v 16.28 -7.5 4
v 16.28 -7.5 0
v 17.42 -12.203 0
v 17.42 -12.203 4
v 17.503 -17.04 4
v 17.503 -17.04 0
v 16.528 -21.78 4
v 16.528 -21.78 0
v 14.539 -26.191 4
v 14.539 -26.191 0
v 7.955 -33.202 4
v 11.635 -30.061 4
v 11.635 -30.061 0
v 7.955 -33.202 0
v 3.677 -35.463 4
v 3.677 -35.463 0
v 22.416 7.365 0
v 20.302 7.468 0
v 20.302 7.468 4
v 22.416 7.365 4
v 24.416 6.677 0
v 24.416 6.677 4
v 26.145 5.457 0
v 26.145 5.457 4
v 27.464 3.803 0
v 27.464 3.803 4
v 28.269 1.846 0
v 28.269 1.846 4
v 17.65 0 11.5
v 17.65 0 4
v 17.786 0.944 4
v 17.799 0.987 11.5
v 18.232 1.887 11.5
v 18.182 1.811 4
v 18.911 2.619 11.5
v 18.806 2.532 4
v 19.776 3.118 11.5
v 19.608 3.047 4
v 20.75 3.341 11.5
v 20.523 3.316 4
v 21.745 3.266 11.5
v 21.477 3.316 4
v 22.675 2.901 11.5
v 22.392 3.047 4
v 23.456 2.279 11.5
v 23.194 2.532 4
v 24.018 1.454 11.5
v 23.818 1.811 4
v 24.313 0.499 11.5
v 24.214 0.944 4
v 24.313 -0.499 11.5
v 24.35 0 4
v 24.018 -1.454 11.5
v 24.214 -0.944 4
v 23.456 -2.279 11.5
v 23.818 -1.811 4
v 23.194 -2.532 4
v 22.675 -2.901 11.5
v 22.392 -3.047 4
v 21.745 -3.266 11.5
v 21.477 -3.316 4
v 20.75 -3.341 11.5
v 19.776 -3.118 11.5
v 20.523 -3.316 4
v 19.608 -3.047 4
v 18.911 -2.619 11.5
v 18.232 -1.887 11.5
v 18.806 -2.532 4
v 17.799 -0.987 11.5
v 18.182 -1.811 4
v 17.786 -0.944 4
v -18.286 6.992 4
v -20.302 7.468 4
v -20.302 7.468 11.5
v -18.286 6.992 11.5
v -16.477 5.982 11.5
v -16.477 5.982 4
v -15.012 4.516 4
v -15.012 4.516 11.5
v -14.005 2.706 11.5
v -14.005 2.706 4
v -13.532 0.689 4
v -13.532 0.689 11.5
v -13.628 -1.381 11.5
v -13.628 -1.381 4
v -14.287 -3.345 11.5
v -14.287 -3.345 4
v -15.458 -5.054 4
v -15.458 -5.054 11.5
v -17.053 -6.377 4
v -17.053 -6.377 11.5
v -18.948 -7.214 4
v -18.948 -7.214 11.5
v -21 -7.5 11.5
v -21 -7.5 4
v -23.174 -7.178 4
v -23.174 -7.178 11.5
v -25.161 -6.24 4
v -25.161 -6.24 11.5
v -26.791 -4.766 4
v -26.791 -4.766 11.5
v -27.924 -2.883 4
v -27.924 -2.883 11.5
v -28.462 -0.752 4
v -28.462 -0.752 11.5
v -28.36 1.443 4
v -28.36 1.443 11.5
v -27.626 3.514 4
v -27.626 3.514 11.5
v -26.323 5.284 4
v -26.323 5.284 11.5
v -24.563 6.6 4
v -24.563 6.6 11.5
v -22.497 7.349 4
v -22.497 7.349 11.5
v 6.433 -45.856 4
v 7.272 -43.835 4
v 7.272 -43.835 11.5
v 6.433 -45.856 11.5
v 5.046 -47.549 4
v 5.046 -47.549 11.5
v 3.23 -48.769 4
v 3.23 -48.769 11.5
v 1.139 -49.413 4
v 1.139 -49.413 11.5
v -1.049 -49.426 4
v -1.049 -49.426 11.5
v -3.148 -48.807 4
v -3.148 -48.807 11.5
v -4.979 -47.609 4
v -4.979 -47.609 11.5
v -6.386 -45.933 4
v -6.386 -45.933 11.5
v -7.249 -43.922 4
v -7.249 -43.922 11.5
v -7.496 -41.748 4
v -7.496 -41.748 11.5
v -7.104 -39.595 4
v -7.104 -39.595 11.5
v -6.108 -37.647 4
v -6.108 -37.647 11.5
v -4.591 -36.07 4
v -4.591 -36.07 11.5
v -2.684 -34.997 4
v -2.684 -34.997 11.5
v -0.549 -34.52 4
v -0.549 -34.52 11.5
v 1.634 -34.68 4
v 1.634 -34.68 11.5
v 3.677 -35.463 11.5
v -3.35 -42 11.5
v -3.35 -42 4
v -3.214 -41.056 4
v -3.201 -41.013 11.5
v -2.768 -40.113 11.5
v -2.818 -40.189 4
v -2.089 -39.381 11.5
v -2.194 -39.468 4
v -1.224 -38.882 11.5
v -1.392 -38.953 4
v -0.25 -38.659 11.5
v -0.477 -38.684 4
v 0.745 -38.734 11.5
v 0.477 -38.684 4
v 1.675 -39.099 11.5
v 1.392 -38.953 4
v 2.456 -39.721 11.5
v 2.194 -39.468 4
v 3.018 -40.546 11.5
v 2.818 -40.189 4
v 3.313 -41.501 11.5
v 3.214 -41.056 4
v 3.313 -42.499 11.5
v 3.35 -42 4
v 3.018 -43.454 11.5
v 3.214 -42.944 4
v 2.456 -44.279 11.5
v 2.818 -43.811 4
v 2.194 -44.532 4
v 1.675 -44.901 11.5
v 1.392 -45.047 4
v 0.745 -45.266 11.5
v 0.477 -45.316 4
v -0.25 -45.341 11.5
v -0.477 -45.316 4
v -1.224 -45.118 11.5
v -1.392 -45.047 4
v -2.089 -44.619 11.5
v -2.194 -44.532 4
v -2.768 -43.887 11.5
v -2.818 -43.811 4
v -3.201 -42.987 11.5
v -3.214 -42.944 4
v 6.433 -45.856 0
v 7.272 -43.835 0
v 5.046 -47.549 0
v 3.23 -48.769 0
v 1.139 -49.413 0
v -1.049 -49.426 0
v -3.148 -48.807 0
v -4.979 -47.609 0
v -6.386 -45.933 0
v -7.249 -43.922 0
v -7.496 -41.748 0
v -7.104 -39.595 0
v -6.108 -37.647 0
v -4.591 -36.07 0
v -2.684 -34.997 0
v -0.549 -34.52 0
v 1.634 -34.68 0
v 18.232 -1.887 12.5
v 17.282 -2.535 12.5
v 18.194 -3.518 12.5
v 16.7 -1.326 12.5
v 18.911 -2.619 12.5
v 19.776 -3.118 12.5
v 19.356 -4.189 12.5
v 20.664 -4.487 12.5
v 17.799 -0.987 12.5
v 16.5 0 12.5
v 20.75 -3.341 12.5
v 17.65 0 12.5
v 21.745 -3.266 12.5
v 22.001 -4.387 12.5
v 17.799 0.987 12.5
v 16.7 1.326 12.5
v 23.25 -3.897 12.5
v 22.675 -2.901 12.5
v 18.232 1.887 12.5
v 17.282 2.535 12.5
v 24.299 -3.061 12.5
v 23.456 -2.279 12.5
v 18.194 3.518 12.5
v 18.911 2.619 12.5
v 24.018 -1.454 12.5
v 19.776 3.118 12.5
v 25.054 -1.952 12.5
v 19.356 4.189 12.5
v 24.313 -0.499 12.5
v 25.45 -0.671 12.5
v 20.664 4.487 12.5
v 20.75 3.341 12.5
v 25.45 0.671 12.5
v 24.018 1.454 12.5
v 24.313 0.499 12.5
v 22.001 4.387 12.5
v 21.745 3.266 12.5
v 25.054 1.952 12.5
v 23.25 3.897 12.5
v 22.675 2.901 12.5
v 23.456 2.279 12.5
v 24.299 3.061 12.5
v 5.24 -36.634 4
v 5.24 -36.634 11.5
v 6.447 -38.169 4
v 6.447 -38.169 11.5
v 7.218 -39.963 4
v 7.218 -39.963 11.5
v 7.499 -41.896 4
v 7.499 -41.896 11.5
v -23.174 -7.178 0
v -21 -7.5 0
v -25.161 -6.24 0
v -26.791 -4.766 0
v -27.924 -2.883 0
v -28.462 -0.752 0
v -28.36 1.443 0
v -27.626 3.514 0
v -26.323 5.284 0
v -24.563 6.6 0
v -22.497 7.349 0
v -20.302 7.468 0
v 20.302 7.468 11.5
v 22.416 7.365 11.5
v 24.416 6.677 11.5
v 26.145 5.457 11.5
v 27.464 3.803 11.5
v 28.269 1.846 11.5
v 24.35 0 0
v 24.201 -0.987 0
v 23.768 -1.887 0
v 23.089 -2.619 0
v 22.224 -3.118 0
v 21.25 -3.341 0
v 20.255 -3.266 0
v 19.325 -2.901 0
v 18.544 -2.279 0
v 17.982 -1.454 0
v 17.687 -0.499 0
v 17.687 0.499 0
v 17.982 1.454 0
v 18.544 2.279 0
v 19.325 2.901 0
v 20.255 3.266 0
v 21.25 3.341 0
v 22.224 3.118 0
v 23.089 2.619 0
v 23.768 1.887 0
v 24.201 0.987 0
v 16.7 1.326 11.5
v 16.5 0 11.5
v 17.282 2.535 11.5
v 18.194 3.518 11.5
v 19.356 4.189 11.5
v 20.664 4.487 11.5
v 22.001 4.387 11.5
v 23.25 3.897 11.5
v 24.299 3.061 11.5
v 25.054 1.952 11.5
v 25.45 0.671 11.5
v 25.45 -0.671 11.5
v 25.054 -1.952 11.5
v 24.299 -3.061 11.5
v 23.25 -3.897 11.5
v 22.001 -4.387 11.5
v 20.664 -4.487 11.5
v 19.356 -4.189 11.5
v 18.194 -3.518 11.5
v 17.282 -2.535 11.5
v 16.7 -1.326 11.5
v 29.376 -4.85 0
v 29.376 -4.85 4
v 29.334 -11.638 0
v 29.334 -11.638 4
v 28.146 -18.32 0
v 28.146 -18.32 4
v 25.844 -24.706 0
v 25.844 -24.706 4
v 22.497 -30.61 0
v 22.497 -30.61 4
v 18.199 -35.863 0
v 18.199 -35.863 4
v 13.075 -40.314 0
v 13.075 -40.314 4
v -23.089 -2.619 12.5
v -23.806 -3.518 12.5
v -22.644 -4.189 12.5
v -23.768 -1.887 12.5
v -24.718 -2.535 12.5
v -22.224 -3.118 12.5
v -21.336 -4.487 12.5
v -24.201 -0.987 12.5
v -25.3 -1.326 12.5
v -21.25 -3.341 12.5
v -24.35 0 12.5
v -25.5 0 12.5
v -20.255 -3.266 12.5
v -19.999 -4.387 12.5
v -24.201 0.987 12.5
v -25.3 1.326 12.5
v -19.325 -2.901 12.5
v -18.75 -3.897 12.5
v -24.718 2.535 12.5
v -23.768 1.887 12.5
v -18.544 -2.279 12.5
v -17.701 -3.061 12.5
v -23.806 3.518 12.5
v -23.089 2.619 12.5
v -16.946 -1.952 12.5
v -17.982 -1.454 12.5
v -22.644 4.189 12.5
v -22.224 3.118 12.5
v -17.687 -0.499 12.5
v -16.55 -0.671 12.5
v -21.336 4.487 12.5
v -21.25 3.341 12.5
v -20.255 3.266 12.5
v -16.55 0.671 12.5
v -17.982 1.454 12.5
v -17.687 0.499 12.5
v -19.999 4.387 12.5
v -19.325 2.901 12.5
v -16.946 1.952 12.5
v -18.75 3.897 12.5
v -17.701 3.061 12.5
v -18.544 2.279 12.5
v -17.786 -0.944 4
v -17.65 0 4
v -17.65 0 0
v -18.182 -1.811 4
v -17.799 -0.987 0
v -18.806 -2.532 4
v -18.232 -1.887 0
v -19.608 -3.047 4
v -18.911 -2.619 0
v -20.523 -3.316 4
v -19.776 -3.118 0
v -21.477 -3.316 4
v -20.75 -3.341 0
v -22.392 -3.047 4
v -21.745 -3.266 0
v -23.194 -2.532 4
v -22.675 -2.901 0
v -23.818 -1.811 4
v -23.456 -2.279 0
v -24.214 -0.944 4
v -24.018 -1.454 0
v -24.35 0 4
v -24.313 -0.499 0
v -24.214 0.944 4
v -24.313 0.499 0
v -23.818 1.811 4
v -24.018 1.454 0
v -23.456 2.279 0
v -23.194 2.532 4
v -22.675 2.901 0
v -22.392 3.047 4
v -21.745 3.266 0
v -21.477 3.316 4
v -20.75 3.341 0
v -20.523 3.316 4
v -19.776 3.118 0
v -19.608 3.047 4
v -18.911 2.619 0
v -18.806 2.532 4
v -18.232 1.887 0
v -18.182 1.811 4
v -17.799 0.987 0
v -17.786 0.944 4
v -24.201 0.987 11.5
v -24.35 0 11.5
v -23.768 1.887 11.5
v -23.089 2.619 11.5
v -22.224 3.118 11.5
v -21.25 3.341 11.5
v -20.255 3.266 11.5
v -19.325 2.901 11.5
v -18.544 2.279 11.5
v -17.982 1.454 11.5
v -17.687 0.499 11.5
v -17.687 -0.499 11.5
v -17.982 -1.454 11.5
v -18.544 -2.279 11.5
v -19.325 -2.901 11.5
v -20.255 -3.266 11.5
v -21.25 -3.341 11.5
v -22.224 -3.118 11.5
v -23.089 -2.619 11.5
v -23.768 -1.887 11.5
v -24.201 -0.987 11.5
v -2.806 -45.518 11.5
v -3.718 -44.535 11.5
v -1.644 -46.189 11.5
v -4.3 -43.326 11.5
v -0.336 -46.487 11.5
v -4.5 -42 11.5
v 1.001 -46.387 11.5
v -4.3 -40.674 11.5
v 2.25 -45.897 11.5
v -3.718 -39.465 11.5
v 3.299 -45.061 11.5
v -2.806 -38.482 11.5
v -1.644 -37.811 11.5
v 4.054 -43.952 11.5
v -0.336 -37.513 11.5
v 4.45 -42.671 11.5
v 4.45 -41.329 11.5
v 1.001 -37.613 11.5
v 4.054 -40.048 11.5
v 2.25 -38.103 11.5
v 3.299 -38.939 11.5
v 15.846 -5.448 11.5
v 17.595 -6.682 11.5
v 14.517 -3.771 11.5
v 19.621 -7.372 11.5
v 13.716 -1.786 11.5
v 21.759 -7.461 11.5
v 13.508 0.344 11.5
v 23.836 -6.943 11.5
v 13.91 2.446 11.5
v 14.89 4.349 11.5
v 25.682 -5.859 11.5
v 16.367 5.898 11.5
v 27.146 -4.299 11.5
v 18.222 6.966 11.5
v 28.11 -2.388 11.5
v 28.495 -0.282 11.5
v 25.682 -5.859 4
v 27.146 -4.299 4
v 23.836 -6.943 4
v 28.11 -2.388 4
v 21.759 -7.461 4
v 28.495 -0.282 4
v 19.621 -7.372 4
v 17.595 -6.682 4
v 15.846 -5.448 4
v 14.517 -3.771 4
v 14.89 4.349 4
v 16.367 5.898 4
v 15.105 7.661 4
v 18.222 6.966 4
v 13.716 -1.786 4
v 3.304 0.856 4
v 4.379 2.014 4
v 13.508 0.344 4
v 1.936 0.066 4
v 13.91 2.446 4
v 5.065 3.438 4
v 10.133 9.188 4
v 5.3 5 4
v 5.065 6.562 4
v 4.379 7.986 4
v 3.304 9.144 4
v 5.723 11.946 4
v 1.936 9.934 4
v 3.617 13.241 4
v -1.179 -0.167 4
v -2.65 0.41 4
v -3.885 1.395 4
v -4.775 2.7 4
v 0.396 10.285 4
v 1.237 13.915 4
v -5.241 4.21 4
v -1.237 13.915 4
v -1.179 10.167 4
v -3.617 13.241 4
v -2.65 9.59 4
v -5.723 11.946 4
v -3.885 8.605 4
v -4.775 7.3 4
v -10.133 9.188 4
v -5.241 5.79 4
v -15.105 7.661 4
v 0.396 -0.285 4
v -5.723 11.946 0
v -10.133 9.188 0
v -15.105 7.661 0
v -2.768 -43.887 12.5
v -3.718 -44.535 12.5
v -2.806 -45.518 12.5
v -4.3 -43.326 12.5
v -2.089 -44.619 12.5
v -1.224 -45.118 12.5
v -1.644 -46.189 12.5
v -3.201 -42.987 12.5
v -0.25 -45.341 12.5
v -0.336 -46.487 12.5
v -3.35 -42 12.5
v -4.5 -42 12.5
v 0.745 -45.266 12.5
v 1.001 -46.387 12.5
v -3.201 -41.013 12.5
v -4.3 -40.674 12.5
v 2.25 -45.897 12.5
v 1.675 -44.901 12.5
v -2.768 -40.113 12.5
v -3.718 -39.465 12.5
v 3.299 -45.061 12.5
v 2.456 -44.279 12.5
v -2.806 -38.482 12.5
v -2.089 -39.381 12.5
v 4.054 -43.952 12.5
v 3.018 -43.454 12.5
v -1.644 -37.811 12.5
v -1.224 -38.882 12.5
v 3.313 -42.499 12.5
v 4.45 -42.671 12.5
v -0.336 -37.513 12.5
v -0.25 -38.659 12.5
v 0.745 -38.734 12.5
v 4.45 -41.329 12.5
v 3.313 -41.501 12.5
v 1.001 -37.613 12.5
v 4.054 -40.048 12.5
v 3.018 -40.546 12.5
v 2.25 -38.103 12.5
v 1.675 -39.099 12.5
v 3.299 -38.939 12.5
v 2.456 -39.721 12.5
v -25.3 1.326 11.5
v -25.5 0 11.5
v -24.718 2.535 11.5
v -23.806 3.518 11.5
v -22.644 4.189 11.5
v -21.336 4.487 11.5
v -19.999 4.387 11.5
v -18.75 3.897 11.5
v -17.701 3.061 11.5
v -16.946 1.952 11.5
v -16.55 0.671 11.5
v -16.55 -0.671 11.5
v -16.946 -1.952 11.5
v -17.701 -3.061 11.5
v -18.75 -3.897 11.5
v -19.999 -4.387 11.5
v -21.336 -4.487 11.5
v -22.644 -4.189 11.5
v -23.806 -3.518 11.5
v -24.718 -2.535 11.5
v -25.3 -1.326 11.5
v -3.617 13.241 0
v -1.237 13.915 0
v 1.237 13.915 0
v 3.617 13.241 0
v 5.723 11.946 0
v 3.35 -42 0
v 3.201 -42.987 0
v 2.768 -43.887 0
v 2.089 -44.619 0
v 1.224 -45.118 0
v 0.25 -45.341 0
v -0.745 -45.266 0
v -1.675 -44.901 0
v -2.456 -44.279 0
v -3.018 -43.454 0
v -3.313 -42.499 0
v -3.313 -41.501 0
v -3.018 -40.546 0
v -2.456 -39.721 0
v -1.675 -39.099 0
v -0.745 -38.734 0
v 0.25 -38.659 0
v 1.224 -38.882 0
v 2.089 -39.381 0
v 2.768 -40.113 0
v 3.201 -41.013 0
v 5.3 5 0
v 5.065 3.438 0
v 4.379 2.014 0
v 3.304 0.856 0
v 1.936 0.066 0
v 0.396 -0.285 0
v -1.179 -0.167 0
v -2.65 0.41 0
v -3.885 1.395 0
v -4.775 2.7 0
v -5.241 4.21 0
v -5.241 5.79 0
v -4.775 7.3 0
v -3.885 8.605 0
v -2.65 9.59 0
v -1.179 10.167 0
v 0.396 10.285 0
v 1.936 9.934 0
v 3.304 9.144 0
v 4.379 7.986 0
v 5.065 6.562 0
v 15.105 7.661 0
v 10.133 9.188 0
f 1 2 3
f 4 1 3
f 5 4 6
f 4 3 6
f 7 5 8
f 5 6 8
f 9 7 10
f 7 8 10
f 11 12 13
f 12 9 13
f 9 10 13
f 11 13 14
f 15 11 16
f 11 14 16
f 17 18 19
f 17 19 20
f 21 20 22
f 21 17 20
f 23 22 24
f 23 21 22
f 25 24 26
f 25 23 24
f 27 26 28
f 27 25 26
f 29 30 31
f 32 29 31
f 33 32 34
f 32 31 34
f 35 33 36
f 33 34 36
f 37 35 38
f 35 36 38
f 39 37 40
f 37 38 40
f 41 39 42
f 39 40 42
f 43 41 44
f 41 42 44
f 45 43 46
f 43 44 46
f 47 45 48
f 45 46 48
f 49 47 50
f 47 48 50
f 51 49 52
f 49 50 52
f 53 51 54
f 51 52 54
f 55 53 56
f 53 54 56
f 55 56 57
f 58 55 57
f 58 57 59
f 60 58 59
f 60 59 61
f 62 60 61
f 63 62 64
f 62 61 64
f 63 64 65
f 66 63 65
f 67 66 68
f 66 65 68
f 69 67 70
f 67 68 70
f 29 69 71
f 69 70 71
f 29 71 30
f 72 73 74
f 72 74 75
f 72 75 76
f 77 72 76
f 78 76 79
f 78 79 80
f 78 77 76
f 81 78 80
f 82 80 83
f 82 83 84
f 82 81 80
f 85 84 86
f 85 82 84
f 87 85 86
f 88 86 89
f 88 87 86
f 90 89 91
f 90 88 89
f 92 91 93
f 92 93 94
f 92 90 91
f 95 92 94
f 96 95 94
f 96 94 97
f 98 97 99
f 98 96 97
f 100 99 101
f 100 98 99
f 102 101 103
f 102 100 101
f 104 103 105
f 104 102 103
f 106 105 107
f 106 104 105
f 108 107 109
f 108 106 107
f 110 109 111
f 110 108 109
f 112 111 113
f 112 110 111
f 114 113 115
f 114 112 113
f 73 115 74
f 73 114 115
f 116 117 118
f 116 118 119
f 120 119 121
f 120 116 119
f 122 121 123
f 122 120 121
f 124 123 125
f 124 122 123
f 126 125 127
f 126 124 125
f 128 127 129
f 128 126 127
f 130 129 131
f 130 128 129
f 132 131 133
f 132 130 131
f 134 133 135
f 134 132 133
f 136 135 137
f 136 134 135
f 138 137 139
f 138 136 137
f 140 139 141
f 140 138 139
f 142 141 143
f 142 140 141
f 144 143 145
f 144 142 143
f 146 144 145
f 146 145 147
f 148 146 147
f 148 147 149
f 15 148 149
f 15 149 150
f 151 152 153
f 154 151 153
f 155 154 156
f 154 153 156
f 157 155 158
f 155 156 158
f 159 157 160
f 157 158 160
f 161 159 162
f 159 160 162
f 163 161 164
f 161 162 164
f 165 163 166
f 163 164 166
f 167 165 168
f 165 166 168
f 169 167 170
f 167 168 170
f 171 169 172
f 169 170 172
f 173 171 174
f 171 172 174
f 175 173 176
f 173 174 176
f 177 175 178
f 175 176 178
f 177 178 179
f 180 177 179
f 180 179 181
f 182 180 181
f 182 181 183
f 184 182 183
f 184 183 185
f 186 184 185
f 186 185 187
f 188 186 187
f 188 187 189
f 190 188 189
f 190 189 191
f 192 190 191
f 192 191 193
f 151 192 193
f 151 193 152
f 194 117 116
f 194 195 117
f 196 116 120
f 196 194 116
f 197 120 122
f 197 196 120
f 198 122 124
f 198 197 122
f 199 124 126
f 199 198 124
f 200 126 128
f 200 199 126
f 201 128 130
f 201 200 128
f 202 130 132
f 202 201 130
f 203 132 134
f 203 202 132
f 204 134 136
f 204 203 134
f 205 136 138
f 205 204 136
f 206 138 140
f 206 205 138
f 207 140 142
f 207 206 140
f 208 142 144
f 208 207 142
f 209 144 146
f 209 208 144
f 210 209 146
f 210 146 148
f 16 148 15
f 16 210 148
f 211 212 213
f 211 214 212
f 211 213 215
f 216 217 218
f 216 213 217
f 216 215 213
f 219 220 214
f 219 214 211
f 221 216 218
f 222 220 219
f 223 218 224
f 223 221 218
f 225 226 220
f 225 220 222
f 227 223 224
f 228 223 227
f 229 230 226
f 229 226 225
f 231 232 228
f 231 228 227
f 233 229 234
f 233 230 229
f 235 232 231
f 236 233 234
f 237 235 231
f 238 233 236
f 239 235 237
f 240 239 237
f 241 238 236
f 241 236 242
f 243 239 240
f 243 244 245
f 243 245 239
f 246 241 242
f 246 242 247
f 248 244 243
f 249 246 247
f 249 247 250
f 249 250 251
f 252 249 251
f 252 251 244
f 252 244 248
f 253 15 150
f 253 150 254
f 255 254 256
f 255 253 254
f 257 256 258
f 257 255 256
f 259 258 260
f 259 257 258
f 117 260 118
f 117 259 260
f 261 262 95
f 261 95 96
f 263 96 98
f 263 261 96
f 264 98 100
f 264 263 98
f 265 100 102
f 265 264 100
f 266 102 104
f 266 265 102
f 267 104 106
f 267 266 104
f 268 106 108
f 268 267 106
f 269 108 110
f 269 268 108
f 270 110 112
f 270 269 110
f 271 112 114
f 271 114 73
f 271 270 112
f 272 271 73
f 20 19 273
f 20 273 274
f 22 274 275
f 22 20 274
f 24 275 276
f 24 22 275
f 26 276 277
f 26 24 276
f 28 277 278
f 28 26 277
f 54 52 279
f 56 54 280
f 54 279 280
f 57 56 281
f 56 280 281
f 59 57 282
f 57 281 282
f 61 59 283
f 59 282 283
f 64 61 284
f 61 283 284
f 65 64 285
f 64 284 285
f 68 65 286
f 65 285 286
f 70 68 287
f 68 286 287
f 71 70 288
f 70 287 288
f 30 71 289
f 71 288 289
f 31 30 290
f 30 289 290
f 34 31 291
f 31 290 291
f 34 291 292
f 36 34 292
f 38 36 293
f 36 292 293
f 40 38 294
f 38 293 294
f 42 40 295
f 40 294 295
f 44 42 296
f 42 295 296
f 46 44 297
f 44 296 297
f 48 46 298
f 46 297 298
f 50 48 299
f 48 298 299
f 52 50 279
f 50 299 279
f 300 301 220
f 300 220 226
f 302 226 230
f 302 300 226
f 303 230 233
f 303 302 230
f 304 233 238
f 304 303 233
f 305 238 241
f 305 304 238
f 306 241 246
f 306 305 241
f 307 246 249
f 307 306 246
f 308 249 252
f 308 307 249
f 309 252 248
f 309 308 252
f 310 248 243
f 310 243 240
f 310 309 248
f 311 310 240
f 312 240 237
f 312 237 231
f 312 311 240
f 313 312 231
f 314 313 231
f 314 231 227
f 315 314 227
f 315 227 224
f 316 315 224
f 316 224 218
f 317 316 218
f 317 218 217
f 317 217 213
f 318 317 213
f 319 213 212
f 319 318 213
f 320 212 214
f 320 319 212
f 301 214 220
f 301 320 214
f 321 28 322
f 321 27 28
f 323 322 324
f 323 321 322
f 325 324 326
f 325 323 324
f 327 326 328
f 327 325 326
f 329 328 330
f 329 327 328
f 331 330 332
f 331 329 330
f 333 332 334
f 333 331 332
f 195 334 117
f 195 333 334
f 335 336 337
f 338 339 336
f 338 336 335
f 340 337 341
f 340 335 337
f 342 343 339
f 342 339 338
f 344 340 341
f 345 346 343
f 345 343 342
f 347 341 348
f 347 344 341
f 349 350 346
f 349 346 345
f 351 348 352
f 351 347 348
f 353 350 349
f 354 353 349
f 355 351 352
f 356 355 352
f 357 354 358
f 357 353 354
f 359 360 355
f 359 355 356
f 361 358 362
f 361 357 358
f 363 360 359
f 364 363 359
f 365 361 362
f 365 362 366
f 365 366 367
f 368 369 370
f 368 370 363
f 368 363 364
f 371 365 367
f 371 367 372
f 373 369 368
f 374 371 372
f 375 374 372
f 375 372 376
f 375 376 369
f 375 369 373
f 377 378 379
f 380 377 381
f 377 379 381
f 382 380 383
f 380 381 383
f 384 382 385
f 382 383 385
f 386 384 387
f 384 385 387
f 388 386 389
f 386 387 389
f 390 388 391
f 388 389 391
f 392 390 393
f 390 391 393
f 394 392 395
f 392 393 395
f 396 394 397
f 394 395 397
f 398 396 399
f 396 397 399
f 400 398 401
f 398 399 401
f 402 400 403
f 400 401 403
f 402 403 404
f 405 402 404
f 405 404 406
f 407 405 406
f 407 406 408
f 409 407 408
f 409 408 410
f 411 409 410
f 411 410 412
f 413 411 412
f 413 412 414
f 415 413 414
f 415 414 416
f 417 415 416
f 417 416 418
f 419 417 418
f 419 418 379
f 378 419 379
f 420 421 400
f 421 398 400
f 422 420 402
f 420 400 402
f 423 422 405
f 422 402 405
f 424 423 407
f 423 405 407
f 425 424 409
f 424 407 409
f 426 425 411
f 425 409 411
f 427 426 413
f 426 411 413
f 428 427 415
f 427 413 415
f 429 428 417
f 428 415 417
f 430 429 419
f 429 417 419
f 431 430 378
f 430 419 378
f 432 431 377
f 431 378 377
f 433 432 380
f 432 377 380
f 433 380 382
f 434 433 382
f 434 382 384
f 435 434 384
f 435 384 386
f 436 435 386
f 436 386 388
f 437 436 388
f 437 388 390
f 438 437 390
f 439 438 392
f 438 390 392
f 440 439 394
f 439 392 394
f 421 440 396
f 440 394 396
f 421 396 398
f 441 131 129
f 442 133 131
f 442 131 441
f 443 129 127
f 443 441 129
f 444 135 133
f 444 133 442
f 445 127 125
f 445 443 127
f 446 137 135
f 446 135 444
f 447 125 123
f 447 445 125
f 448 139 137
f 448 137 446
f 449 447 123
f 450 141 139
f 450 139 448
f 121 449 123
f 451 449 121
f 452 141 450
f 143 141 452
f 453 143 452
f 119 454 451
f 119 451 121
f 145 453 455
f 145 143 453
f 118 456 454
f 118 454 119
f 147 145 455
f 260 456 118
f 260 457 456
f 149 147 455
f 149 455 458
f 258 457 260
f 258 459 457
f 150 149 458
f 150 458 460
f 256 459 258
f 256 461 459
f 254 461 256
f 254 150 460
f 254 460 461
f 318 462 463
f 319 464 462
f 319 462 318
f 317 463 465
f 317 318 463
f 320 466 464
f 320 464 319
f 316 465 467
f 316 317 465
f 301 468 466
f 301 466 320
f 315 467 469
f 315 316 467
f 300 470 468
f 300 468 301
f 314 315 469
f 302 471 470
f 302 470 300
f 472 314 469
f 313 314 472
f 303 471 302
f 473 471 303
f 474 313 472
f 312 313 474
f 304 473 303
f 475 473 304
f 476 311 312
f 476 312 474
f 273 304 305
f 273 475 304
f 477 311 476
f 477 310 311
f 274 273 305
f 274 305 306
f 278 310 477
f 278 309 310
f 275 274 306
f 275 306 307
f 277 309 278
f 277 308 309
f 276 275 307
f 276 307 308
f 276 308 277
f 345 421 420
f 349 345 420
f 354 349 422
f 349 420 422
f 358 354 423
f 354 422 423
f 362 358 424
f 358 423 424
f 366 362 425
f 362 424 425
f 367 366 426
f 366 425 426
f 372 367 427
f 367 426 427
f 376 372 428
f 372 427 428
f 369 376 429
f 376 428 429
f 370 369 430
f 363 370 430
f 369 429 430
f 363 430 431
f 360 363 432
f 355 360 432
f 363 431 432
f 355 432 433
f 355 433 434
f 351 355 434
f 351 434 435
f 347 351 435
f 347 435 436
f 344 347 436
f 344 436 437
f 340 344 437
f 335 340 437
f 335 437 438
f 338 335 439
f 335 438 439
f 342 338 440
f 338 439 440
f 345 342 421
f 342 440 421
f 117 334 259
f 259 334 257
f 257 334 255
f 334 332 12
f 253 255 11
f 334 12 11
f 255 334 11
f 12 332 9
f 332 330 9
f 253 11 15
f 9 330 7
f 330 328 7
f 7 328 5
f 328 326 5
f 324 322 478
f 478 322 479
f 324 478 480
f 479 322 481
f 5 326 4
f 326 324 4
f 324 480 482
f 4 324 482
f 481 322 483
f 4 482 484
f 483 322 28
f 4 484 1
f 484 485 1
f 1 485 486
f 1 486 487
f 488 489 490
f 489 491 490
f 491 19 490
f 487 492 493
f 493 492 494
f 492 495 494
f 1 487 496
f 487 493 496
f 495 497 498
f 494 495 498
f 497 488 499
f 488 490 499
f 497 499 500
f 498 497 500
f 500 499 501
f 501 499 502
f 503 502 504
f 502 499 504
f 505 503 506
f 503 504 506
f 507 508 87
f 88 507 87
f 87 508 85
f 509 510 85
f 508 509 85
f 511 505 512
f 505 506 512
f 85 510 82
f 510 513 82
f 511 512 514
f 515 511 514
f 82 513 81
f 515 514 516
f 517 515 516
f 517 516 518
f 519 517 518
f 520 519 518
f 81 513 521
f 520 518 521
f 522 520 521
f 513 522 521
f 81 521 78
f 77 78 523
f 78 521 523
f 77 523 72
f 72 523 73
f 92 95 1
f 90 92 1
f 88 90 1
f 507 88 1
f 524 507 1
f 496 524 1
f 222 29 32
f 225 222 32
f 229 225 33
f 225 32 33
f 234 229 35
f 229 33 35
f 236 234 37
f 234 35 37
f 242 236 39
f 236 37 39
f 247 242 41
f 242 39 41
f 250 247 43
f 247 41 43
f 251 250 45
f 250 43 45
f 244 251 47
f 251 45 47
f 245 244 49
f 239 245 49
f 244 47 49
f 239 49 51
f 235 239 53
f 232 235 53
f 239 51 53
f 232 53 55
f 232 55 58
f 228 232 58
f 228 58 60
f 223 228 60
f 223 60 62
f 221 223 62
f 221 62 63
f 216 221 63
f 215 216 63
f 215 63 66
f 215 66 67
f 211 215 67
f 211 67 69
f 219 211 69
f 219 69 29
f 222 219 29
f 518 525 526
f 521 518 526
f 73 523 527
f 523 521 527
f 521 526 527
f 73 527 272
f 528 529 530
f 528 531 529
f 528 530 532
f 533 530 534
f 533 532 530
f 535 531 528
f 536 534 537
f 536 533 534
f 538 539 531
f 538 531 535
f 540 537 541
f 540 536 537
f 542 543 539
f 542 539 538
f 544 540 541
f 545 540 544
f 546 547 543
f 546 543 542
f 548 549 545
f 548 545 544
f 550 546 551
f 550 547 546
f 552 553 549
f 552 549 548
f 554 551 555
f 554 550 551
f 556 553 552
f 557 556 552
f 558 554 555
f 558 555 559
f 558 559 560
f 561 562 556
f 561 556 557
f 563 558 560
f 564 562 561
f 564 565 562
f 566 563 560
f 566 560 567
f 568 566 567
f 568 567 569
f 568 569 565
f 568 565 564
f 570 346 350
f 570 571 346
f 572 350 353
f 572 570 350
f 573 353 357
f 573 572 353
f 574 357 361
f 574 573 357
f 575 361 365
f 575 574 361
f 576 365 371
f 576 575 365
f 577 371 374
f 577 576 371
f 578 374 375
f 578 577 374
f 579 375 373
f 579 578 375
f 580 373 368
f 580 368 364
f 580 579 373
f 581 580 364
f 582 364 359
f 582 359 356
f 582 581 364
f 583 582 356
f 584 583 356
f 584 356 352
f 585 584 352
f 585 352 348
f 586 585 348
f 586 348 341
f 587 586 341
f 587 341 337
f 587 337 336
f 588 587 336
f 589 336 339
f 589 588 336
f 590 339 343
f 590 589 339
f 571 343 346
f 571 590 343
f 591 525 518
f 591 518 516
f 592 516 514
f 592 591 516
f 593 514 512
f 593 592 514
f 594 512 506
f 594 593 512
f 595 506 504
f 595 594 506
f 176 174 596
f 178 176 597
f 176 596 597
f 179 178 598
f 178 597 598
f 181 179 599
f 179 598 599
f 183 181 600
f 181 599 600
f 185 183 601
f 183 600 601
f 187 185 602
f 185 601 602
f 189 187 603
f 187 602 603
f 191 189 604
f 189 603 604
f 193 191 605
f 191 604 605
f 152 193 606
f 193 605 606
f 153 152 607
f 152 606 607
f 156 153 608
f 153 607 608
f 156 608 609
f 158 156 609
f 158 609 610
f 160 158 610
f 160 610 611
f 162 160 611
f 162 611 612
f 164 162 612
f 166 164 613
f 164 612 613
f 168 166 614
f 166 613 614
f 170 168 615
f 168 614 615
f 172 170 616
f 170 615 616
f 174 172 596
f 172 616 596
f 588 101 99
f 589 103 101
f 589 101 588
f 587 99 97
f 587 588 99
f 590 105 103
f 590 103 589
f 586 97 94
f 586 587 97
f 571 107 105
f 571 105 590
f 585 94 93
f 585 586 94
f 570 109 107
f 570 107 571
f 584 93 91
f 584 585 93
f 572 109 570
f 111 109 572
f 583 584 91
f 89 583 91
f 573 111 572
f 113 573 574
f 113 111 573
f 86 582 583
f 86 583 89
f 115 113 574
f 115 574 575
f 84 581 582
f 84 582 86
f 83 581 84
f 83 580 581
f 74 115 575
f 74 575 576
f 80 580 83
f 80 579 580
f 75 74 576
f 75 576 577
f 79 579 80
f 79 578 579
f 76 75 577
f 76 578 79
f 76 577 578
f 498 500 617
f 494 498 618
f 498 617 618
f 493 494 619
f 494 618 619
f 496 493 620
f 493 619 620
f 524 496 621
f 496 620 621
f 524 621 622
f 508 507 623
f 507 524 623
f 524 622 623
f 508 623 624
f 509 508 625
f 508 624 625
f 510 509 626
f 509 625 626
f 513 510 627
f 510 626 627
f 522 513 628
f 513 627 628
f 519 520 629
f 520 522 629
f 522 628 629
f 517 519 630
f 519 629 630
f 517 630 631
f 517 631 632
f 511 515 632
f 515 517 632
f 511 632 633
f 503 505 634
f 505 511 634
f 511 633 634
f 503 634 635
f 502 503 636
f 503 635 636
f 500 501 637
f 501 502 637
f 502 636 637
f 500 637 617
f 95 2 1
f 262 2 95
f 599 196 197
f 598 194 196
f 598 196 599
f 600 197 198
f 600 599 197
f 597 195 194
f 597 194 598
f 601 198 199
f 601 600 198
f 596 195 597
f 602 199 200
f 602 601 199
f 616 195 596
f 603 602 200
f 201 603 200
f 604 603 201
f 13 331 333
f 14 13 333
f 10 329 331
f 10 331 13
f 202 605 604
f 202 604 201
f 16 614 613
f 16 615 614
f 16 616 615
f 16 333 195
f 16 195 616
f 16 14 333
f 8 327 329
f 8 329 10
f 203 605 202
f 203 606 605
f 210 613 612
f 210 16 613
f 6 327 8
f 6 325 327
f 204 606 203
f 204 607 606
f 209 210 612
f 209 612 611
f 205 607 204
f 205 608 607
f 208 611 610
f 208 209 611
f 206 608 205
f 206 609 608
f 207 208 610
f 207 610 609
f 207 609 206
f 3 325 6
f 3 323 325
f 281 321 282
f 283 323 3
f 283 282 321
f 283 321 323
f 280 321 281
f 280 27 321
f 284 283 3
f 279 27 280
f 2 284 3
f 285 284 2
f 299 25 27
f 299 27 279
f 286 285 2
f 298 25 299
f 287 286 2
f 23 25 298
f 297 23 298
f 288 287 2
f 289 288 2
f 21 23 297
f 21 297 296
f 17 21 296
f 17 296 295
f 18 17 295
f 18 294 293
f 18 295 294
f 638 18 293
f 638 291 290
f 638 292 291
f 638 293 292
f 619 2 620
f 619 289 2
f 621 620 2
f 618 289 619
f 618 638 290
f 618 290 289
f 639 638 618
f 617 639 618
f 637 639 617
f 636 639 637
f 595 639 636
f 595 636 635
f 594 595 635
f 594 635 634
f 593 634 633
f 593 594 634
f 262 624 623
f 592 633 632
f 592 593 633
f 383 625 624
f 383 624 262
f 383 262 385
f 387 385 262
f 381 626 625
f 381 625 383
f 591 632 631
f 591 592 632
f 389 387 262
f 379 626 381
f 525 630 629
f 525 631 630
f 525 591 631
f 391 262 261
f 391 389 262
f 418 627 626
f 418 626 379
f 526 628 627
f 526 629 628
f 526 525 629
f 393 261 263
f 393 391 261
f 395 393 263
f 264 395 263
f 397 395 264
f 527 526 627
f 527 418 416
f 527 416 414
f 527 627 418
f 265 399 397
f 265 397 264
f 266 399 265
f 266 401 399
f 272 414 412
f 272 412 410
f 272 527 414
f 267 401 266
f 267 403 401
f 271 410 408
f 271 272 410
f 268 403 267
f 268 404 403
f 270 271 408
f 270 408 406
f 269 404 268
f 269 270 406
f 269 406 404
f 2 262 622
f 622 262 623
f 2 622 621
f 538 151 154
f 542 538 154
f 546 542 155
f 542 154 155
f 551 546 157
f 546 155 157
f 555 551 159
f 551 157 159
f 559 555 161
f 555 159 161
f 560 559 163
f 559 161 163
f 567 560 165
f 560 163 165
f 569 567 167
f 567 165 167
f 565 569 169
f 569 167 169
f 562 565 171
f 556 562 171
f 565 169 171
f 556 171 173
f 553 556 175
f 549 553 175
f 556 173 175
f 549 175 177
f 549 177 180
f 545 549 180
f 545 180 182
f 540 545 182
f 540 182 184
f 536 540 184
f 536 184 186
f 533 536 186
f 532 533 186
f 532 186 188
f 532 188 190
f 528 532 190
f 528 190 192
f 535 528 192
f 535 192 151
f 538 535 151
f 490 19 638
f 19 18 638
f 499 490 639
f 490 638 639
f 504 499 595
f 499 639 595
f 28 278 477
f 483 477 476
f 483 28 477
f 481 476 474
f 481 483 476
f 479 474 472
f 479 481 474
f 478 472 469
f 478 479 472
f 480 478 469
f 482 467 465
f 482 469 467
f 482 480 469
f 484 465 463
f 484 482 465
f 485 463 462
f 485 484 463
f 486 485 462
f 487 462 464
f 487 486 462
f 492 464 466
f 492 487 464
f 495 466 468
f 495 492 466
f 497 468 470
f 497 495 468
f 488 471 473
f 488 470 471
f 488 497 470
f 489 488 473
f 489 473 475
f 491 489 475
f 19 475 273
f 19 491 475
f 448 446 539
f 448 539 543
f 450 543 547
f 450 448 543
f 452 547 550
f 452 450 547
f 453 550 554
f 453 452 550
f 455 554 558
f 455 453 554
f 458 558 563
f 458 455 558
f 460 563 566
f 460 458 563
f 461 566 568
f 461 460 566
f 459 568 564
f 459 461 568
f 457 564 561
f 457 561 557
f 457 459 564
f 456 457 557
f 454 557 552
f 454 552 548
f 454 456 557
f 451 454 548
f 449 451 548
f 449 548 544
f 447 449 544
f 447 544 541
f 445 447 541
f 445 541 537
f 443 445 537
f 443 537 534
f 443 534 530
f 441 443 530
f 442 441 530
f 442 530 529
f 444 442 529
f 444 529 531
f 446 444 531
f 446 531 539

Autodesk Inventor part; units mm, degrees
ref_plane "YZ Plane" through (0, 0, 0) normal (1, 0, 0) x (0, 1, 0)
ref_plane "XZ Plane" through (0, 0, 0) normal (0, 1, 0) x (-1, 0, 0)
ref_plane "XY Plane" through (0, 0, 0) normal (0, 0, 1) x (1, 0, 0)
sketch "Skizze1" plane through (0, 0, 0) normal (0, 0, 1) x (1, 0, 0)
  line L0 (-50.1686, 0) -> (50.7617, 0) projected
  line L1 (0, -73.5762) -> (0, 44.2069) projected
  circle A0 centre (-21, 0) radius 3.35
  circle A1 centre (-21, 0) radius 14.75 construction
  circle A2 centre (21, 0) radius 3.35
  circle A3 centre (21, 0) radius 14.75 construction
  circle A4 centre (0, -42) radius 3.35
  circle A5 centre (0, -42) radius 14.75 construction
  circle A6 centre (0, 5) radius 5.3
  circle A7 centre (0, 5) radius 9
  circle A8 centre (-21, 0) radius 7.5
  circle A9 centre (21, 0) radius 7.5
  arc A10 (-20.3023, 7.4675) -> (-5.7233, 11.9458) centre (-18.4418, 27.3808) ccw
  arc A11 (5.7233, 11.9458) -> (20.3023, 7.4675) centre (18.4418, 27.3808) ccw
  line L2 (-21, -7.5) -> (21, -7.5)
  circle A12 centre (0, -42) radius 7.5
  arc A13 (3.6768, -35.4631) -> (14.5419, -3.8136) centre (-4.4018, -15) ccw
  arc A14 (7.272, -43.8351) -> (28.2692, 1.8462) centre (-10.5, -8) ccw
  point P0 (0, 0)
  point P1 (28.1068, -2.3967)
  point P2 (19.4082, -7.3291)
  point P3 (-19.4082, -7.3291)
  point P4 (13.6211, 1.3423)
  point P5 (2.9103, -48.9123)
  point P6 (28.4986, 0.1465)
  point P7 (-0.3947, -34.5104)
  point P8 (13.9951, -2.6799)
  dimension "d16" = 15
  dimension "d0" = 6.7
  dimension "d3" = 29.5
  dimension "d4" = 21
  dimension "d5" = 6.7
  dimension "d6" = 42
  dimension "d7" = 29.5
  dimension "d12" = 10.6
  dimension "d13" = 18
  dimension "d14" = 5
  dimension "d15" = 15
  dimension "d19" = 20
  dimension "d20" = 20
  dimension "d47" = 15
  dimension "d51" = 22
  dimension "d52" = 40
  dimension "d53" = 27
  dimension "d54" = 34
extrude "Extrusion1" add sketch "Skizze1" against normal blind 4 contours A0 L0 A8 | L0 A8 A0 | A8 A10 A7 L0 | L0 A7 L1 L2 A8 | A7 L1 A6 L0 | L0 A6 L1 A7 | A7 L0 A9 A13 L2 L1 | L1 A6 L0 A7 | L1 A7 L0 A6 | A7 A11 A9 L0 | A12 L1 A4 | L1 A4 A12 | A13 A9 L2 | L2 A9 L0 A14 A12 A13 | A9 L0 A2 | L0 A2 A9 | A9 A14 L0
sketch "Skizze4" plane through (0, 0, -4) normal (0, 0, -1) x (-1, 0, 0)
  circle A0 centre (-21, 0) radius 3.35 projected
  circle A1 centre (0, 5) radius 5.3 projected
  circle A2 centre (21, 0) radius 3.35 projected
  line L0 (-16.2803, -7.5) -> (21, -7.5) projected
  arc A3 (21, -7.5) -> (20.3023, 7.4675) centre (21, 0) ccw projected
  arc A4 (5.7233, 11.9458) -> (20.3023, 7.4675) centre (18.4418, 27.3808) ccw projected
  arc A5 (5.7233, 11.9458) -> (-5.7233, 11.9458) centre (0, 5) ccw projected
  arc A6 (-20.3023, 7.4675) -> (-5.7233, 11.9458) centre (-18.4418, 27.3808) ccw projected
  arc A7 (-20.3023, 7.4675) -> (-28.2692, 1.8462) centre (-21, 0) ccw projected
  circle A8 centre (-21, 0) radius 7.5
  circle A9 centre (21, 0) radius 7.5
  arc A10 (-7.272, -43.8351) -> (-3.6768, -35.4631) centre (0, -42) ccw projected
  arc A11 (-28.2692, 1.8462) -> (-7.272, -43.8351) centre (10.5, -8) ccw projected
  arc A12 (-16.2803, -7.5) -> (-3.6768, -35.4631) centre (4.4018, -15) ccw projected
  point P0 (0, 0)
  dimension "d34" = 15
  dimension "d35" = 15
extrude "Extrusion4" add sketch "Skizze4" along normal blind 7.5 contours A9 A3 | A7 A8
sketch "Skizze5" plane through (21, 0, -11.5) normal (0, 0, -1) x (-1, 0, 0)
  circle A0 centre (0, 0) radius 3.35 projected
  circle A1 centre (0, 0) radius 7.5 projected
  circle A2 centre (42, 0) radius 3.35 projected
  circle A3 centre (42, 0) radius 7.5 projected
  circle A4 centre (0, 0) radius 4.5
  circle A5 centre (42, 0) radius 3.4 projected
  circle A6 centre (42, 0) radius 4.5
  point P0 (21, 0)
  dimension "d38" = 9
  dimension "d39" = 9
extrude "Extrusion5" add sketch "Skizze5" along normal blind 1 contours A4 | A5 | A6
sketch "Skizze8" plane through (0, 0, -4) normal (0, 0, -1) x (-1, 0, 0)
  circle A0 centre (0, -42) radius 3.35 projected
  circle A1 centre (0, 5) radius 5.3 projected
  arc A2 (-28.2692, 1.8462) -> (-20.3023, 7.4675) centre (-21, 0) ccw projected
  arc A3 (-28.2692, 1.8462) -> (-7.272, -43.8351) centre (10.5, -8) ccw projected
  arc A4 (-7.272, -43.8351) -> (-3.6768, -35.4631) centre (0, -42) ccw projected
  arc A5 (-16.2803, -7.5) -> (-3.6768, -35.4631) centre (4.4018, -15) ccw projected
  line L0 (-16.2803, -7.5) -> (21, -7.5) projected
  arc A6 (20.3023, 7.4675) -> (21, -7.5) centre (21, 0) ccw projected
  arc A7 (5.7233, 11.9458) -> (20.3023, 7.4675) centre (18.4418, 27.3808) ccw projected
  arc A8 (5.7233, 11.9458) -> (-5.7233, 11.9458) centre (0, 5) ccw projected
  arc A9 (-20.3023, 7.4675) -> (-5.7233, 11.9458) centre (-18.4418, 27.3808) ccw projected
  circle A10 centre (0, -42) radius 7.5
  point P0 (0, 0)
  dimension "d55" = 15
extrude "Extrusion7" add sketch "Skizze8" along normal blind 7.5 contours A10 A4
sketch "Skizze9" plane through (0, -42, -11.5) normal (0, 0, -1) x (-1, 0, 0)
  circle A0 centre (0, 0) radius 3.35 projected
  circle A1 centre (0, 0) radius 7.5 projected
  circle A2 centre (0, 0) radius 4.5
  point P0 (0, 42)
  dimension "d58" = 9
extrude "Extrusion8" add sketch "Skizze9" along normal blind 1 contours A2
mirror "Spiegeln1" about plane through (0, 0, 0) normal (0, 0, 1) of "Extrusion1", "Extrusion4", "Extrusion5", "Extrusion7", "Extrusion8"
sketch "Skizze19" plane through (0, 0, 0) normal (0, 0, 1) x (1, 0, 0)
  line L0 (-37.3748, -55.7465) -> (60.3793, -55.7465)
  line L1 (60.3793, -55.7465) -> (60.3793, 24.5119)
  line L2 (60.3793, 24.5119) -> (-37.3748, 24.5119)
  line L3 (-37.3748, 24.5119) -> (-37.3748, -55.7465)
  point P0 (0, 0)
extrude "Extrusion17" cut sketch "Skizze19" against normal blind 13
equation "\"d5\" = d0"
equation "\"d7\" = d3"
equation "\"d20\" = d19"
properties part number "Linearwagen_MauroW_inside"
